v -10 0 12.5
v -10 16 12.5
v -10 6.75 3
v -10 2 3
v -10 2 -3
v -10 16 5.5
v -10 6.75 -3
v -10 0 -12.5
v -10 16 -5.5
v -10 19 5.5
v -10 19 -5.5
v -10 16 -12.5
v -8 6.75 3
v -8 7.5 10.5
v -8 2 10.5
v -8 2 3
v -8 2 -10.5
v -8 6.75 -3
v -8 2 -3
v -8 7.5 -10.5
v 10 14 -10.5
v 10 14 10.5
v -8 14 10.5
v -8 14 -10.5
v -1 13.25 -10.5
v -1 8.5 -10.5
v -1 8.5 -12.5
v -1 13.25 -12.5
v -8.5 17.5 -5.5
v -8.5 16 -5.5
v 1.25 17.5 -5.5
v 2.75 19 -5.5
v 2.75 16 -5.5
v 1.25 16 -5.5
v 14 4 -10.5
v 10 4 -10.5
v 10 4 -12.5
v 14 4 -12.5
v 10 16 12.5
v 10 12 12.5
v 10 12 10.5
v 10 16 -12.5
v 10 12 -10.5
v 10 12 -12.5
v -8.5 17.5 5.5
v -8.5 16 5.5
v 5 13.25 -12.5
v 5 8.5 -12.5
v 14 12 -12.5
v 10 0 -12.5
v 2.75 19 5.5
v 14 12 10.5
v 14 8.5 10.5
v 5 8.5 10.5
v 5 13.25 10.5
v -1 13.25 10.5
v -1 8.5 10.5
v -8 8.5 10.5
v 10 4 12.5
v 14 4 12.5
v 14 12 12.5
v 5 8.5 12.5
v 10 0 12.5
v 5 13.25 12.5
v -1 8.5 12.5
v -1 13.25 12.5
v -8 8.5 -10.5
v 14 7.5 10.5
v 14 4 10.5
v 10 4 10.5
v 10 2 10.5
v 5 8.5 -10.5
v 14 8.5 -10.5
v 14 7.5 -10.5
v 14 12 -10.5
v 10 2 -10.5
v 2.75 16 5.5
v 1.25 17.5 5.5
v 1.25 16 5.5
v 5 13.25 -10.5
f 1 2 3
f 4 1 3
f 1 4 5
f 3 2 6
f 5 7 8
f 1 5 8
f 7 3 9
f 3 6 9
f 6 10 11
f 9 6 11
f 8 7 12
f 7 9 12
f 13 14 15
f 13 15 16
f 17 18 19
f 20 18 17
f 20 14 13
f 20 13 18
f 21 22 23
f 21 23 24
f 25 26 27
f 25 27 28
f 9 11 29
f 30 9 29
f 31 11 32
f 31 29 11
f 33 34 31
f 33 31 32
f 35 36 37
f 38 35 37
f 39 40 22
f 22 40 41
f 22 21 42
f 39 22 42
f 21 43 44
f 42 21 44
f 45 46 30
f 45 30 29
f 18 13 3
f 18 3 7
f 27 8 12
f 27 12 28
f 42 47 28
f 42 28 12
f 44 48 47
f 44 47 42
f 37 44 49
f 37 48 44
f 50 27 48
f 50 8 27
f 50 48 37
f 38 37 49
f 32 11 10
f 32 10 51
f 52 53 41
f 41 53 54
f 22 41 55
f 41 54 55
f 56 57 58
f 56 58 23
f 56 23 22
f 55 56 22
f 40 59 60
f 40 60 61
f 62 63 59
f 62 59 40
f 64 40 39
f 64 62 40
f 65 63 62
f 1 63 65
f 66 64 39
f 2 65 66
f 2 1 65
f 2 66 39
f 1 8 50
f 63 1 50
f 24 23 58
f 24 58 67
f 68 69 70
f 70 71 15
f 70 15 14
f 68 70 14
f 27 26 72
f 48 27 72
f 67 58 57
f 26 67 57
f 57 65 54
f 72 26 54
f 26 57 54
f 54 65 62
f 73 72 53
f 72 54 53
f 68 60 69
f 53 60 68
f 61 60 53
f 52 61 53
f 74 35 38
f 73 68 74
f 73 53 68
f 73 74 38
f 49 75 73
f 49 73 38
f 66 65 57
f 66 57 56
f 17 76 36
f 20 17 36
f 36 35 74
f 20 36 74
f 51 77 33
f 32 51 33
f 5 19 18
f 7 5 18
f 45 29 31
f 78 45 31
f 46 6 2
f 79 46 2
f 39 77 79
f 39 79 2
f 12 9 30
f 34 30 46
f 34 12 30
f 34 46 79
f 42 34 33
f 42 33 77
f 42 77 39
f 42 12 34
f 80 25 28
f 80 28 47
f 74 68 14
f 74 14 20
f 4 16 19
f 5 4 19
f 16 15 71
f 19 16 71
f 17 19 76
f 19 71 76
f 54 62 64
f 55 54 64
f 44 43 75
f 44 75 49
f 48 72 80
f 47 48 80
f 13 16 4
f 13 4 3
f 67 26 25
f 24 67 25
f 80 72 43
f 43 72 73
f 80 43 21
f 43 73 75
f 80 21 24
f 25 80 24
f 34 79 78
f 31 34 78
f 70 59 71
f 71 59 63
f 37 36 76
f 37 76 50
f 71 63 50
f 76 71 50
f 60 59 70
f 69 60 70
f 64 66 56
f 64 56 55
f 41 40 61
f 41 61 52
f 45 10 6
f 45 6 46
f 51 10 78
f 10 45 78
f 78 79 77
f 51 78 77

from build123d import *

# Parameters (mm, degrees)
CROQUIS1_W              = 20
CROQUIS1_H              = 25
SALIENTE_EXTRUIR4_DEPTH = 16
CORTAR_EXTRUIR1_START   = 10
CROQUIS4_W              = 21
CROQUIS4_H              = 12
CORTAR_EXTRUIR1_DEPTH   = 18
SALIENTE_EXTRUIR6_START = -10
CROQUIS5_W              = 21
CROQUIS5_H              = 1
SALIENTE_EXTRUIR6_DEPTH = 24
SALIENTE_EXTRUIR7_START = 10
CROQUIS7_W              = 2
CROQUIS7_H              = 8
SALIENTE_EXTRUIR7_DEPTH = 4
SALIENTE_EXTRUIR8_START = 16
CROQUIS8_W              = 12.75
CROQUIS8_H              = 11
SALIENTE_EXTRUIR8_DEPTH = 3
CROQUIS9_W              = 9.75
CROQUIS9_H              = 1.5
CORTAR_EXTRUIR2_DEPTH   = 11.5
CROQUIS11_W             = 6
CROQUIS11_H             = 4.75
CORTAR_EXTRUIR4_DEPTH   = 16.5
CROQUIS12_W             = 6
CROQUIS12_H             = 4.75
CORTAR_EXTRUIR5_DEPTH   = 33


with BuildPart() as part:
    # Croquis1 → Saliente-Extruir4 (new body)
    with BuildSketch(Plane(origin=(0, 0, 0), x_dir=(1, 0, 0), z_dir=(0, 1, 0))):
        Rectangle(CROQUIS1_W, CROQUIS1_H)
    extrude(amount=SALIENTE_EXTRUIR4_DEPTH)

    # Croquis4 → Cortar-Extruir1 (cut)
    with BuildSketch(Plane(origin=(0, 0, 0), x_dir=(0, 0, -1), z_dir=(1, 0, 0)).offset(CORTAR_EXTRUIR1_START)):
        with Locations((0, 8)):
            Rectangle(CROQUIS4_W, CROQUIS4_H)
    extrude(amount=-CORTAR_EXTRUIR1_DEPTH, mode=Mode.SUBTRACT)

    # Croquis5 → Saliente-Extruir6 (add)
    with BuildSketch(Plane(origin=(0, 0, 0), x_dir=(0, 0, -1), z_dir=(1, 0, 0)).offset(SALIENTE_EXTRUIR6_START)):
        with Locations((0, 8)):
            Rectangle(CROQUIS5_W, CROQUIS5_H)
    extrude(amount=SALIENTE_EXTRUIR6_DEPTH)

    # Croquis7 → Saliente-Extruir7 (add)
    with BuildSketch(Plane(origin=(0, 0, 0), x_dir=(0, 0, -1), z_dir=(1, 0, 0)).offset(SALIENTE_EXTRUIR7_START)):
        with Locations((-11.5, 8)):
            Rectangle(CROQUIS7_W, CROQUIS7_H)
        with Locations((11.5, 8)):
            Rectangle(CROQUIS7_W, CROQUIS7_H)
    extrude(amount=SALIENTE_EXTRUIR7_DEPTH)

    # Croquis8 → Saliente-Extruir8 (add)
    with BuildSketch(Plane(origin=(0, 0, 0), x_dir=(1, 0, 0), z_dir=(0, 1, 0)).offset(SALIENTE_EXTRUIR8_START)):
        with Locations((-3.625, 0)):
            Rectangle(CROQUIS8_W, CROQUIS8_H)
    extrude(amount=SALIENTE_EXTRUIR8_DEPTH)

    # Croquis9 → Cortar-Extruir2 (cut, symmetric)
    with BuildSketch(Plane.XY):
        with Locations((-3.625, 16.75)):
            Rectangle(CROQUIS9_W, CROQUIS9_H)
    extrude(amount=CORTAR_EXTRUIR2_DEPTH, both=True, mode=Mode.SUBTRACT)

    # Croquis11 → Cortar-Extruir4 (cut, symmetric)
    with BuildSketch(Plane.XY):
        with Locations((2, 10.875)):
            Rectangle(CROQUIS11_W, CROQUIS11_H)
    extrude(amount=CORTAR_EXTRUIR4_DEPTH, both=True, mode=Mode.SUBTRACT)

    # Croquis12 → Cortar-Extruir5 (cut)
    with BuildSketch(Plane(origin=(0, 0, 0), x_dir=(0, 0, -1), z_dir=(1, 0, 0))):
        with Locations((0, 4.375)):
            Rectangle(CROQUIS12_W, CROQUIS12_H)
    extrude(amount=-CORTAR_EXTRUIR5_DEPTH, mode=Mode.SUBTRACT)


solid = part.part
